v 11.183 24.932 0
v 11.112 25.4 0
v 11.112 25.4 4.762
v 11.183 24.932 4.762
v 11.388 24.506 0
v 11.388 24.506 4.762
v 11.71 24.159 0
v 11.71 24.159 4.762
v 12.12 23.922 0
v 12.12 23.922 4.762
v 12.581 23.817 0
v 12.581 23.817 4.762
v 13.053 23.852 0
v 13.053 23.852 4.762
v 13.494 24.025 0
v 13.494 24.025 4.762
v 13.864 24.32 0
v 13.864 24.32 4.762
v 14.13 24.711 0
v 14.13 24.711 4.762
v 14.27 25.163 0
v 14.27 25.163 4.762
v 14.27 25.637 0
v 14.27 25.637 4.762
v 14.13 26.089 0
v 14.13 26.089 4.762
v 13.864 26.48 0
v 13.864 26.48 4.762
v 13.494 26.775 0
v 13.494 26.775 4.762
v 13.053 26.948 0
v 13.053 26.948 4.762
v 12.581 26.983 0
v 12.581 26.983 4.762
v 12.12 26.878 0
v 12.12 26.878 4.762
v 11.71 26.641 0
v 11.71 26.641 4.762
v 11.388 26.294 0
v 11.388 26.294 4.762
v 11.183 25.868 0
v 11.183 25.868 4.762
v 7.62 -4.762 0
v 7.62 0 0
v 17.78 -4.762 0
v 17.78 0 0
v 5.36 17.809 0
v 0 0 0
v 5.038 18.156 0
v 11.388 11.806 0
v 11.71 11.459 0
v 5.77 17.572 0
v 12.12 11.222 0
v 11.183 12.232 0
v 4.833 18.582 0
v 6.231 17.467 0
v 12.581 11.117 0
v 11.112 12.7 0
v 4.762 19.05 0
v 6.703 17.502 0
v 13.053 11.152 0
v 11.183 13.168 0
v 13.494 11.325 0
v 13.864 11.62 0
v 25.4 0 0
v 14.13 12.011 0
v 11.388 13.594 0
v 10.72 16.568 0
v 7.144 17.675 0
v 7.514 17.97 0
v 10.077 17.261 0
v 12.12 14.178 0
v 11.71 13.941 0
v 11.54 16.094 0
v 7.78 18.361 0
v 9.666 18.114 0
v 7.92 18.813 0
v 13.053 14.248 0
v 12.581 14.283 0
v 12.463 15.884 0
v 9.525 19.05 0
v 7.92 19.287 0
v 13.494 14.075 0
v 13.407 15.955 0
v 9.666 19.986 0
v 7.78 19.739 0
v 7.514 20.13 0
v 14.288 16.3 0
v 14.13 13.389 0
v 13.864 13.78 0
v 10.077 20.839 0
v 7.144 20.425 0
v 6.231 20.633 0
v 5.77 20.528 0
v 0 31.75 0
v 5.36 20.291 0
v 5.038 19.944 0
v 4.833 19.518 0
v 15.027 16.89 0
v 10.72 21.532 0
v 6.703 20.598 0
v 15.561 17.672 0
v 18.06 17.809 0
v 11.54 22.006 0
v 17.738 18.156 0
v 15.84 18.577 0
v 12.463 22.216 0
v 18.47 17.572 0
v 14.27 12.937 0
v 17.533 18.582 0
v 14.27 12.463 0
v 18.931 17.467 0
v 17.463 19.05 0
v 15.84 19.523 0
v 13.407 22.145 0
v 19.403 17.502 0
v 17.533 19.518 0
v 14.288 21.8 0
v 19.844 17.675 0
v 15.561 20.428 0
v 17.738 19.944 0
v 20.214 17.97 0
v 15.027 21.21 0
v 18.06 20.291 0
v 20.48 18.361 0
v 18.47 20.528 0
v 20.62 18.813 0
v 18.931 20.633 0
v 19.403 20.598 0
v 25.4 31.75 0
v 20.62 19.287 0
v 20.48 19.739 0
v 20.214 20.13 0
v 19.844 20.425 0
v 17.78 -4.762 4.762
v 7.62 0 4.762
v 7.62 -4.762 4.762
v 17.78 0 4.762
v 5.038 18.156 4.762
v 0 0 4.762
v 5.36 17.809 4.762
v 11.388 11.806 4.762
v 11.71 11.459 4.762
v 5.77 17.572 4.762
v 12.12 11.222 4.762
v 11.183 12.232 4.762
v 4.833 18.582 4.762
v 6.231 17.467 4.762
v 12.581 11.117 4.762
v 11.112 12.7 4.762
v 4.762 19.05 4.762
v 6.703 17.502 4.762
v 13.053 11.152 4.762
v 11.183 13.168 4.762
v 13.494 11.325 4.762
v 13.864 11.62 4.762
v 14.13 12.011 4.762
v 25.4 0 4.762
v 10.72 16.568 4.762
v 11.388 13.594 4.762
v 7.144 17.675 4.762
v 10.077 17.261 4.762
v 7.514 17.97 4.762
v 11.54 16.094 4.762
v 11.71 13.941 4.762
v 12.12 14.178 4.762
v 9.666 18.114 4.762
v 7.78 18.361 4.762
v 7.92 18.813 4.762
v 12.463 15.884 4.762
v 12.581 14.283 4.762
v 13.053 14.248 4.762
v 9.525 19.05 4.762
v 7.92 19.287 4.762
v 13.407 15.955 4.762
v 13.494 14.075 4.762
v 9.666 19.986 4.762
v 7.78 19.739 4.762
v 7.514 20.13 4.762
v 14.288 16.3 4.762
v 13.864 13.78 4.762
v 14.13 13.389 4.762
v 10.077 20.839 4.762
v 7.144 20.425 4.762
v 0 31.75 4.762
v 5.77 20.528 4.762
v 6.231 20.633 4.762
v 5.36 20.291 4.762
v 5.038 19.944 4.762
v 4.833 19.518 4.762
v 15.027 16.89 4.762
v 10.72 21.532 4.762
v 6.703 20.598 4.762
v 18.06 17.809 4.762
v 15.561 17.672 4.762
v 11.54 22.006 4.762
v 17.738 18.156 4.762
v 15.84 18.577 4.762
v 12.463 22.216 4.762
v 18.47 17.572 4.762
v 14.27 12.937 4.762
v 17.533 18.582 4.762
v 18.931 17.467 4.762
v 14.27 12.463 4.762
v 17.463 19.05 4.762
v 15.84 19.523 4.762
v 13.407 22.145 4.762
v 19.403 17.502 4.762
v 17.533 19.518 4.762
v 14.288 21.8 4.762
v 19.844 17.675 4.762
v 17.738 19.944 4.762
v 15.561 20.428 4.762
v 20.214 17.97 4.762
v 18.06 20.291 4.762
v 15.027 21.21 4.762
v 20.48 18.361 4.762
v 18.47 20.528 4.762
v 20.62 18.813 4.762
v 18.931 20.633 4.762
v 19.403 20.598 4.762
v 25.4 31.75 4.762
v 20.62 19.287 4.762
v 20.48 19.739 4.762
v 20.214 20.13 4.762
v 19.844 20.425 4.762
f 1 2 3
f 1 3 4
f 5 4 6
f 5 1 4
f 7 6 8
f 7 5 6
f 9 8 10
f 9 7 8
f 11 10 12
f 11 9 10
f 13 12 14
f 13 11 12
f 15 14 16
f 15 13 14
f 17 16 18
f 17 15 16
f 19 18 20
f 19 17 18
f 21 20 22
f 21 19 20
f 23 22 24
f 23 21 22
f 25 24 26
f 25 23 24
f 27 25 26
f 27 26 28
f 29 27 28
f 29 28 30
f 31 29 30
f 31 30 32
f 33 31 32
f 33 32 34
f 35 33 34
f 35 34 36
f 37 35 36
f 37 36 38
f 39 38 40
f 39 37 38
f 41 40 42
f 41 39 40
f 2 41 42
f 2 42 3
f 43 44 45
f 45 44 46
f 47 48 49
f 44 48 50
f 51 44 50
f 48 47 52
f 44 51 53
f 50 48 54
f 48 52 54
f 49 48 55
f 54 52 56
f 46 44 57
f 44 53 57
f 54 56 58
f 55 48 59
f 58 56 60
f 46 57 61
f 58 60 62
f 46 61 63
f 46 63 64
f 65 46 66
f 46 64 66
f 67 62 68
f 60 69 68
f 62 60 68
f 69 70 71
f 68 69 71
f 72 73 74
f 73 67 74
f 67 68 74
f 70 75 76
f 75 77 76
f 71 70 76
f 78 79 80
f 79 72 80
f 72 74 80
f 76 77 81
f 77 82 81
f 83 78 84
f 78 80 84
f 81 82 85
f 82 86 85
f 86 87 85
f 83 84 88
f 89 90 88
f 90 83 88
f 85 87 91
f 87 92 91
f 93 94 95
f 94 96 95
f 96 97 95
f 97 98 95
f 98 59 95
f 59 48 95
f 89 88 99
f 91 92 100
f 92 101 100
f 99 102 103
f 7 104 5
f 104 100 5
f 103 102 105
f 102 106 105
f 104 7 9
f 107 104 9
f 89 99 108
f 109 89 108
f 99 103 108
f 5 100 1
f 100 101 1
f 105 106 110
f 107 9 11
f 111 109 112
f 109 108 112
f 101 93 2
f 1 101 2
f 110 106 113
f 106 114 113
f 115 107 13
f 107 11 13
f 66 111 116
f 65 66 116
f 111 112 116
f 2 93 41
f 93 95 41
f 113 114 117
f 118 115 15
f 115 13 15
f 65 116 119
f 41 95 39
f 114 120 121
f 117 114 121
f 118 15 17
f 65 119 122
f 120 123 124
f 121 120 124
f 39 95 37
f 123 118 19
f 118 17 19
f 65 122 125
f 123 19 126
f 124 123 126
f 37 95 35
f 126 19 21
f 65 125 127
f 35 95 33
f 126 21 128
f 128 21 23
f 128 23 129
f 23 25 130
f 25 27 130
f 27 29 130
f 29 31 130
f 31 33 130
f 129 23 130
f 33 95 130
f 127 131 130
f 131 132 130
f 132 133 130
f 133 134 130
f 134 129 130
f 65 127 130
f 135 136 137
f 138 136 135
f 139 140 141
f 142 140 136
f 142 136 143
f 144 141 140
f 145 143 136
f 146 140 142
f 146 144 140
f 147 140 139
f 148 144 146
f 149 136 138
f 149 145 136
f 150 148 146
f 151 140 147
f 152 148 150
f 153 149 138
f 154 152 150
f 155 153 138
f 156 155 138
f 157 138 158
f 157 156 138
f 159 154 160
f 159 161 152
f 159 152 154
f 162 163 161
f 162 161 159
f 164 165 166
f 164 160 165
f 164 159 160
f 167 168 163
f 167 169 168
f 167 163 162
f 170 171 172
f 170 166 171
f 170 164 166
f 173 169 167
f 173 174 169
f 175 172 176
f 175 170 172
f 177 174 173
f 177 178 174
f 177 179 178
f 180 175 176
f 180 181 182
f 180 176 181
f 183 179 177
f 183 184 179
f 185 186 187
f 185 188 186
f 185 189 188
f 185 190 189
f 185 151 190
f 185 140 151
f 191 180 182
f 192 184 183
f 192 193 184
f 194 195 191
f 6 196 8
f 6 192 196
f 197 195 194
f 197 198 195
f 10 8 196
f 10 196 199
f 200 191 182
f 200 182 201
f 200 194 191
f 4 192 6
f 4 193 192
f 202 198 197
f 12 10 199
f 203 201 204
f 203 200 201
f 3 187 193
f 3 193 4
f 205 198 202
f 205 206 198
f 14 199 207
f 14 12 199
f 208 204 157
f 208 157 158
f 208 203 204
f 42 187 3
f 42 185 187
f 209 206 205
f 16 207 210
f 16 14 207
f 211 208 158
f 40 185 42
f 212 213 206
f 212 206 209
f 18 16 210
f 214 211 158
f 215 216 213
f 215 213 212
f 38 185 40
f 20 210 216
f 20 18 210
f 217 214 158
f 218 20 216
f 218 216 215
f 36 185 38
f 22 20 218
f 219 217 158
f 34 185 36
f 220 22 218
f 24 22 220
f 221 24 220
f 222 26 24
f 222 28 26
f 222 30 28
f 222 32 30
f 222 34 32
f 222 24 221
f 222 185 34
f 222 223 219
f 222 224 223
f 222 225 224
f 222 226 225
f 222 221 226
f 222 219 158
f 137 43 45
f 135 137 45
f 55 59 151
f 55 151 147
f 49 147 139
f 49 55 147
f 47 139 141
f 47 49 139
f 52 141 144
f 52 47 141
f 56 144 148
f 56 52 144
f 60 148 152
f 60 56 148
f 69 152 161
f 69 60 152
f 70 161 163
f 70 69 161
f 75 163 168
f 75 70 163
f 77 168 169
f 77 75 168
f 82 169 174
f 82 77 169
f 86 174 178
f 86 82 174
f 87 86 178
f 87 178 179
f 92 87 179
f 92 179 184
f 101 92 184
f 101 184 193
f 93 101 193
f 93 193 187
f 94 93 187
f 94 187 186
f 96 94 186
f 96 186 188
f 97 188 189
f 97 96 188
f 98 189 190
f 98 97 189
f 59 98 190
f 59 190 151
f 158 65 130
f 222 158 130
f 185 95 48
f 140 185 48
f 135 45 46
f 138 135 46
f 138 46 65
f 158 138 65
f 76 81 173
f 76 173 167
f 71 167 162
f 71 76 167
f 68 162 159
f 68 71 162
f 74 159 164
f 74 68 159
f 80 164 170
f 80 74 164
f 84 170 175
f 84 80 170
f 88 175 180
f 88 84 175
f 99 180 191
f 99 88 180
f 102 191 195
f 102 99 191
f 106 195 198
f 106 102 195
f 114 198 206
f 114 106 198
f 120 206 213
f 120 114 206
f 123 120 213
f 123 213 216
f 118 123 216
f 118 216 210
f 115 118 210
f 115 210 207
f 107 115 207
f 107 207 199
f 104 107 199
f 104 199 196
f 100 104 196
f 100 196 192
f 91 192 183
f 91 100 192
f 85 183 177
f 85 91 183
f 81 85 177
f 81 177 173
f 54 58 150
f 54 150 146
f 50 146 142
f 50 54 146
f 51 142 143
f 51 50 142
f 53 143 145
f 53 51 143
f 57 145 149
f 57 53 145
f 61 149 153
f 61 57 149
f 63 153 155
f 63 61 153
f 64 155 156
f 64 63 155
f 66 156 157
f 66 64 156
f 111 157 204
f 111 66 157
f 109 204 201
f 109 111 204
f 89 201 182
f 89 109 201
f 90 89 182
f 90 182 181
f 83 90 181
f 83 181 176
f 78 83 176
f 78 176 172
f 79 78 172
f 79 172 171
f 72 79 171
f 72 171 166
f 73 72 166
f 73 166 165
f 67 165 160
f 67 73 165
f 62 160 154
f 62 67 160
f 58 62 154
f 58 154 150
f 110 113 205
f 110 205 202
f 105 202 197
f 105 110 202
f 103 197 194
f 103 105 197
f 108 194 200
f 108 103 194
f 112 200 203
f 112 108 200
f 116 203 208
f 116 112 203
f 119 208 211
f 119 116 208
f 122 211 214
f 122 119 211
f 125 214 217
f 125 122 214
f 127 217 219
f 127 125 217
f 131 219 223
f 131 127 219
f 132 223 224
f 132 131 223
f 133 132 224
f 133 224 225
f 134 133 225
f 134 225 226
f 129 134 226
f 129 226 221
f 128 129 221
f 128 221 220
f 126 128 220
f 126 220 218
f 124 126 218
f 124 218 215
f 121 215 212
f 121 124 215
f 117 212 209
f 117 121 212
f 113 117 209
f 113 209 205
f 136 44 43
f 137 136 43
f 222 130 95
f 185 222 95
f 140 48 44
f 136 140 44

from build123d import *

# Parameters (mm, degrees)
SKETCH1_R           = 3.175
SKETCH1_R_2         = 1.5875
BOSS_EXTRUDE1_DEPTH = 4.7625


with BuildPart() as part:
    # Sketch1 → Boss-Extrude1 (new body)
    with BuildSketch(Plane.XY):
        Polygon((25.4, 0), (25.4, 31.75), (0, 31.75), (0, 0), (7.62, 0), (7.62, -4.7625), (17.78, -4.7625), (17.78, 0), align=None)
        with Locations(Location((12.7, 19.05, 0), (0, 0, 180))):
            Circle(SKETCH1_R, mode=Mode.SUBTRACT)
        with Locations(Location((12.7, 25.4, 0), (0, 0, 180))):
            Circle(SKETCH1_R_2, mode=Mode.SUBTRACT)
        with Locations(Location((19.05, 19.05, 0), (0, 0, 180))):
            Circle(SKETCH1_R_2, mode=Mode.SUBTRACT)
        with Locations(Location((6.35, 19.05, 0), (0, 0, 180))):
            Circle(SKETCH1_R_2, mode=Mode.SUBTRACT)
        with Locations(Location((12.7, 12.7, 0), (0, 0, 180))):
            Circle(SKETCH1_R_2, mode=Mode.SUBTRACT)
    extrude(amount=BOSS_EXTRUDE1_DEPTH)


solid = part.part
